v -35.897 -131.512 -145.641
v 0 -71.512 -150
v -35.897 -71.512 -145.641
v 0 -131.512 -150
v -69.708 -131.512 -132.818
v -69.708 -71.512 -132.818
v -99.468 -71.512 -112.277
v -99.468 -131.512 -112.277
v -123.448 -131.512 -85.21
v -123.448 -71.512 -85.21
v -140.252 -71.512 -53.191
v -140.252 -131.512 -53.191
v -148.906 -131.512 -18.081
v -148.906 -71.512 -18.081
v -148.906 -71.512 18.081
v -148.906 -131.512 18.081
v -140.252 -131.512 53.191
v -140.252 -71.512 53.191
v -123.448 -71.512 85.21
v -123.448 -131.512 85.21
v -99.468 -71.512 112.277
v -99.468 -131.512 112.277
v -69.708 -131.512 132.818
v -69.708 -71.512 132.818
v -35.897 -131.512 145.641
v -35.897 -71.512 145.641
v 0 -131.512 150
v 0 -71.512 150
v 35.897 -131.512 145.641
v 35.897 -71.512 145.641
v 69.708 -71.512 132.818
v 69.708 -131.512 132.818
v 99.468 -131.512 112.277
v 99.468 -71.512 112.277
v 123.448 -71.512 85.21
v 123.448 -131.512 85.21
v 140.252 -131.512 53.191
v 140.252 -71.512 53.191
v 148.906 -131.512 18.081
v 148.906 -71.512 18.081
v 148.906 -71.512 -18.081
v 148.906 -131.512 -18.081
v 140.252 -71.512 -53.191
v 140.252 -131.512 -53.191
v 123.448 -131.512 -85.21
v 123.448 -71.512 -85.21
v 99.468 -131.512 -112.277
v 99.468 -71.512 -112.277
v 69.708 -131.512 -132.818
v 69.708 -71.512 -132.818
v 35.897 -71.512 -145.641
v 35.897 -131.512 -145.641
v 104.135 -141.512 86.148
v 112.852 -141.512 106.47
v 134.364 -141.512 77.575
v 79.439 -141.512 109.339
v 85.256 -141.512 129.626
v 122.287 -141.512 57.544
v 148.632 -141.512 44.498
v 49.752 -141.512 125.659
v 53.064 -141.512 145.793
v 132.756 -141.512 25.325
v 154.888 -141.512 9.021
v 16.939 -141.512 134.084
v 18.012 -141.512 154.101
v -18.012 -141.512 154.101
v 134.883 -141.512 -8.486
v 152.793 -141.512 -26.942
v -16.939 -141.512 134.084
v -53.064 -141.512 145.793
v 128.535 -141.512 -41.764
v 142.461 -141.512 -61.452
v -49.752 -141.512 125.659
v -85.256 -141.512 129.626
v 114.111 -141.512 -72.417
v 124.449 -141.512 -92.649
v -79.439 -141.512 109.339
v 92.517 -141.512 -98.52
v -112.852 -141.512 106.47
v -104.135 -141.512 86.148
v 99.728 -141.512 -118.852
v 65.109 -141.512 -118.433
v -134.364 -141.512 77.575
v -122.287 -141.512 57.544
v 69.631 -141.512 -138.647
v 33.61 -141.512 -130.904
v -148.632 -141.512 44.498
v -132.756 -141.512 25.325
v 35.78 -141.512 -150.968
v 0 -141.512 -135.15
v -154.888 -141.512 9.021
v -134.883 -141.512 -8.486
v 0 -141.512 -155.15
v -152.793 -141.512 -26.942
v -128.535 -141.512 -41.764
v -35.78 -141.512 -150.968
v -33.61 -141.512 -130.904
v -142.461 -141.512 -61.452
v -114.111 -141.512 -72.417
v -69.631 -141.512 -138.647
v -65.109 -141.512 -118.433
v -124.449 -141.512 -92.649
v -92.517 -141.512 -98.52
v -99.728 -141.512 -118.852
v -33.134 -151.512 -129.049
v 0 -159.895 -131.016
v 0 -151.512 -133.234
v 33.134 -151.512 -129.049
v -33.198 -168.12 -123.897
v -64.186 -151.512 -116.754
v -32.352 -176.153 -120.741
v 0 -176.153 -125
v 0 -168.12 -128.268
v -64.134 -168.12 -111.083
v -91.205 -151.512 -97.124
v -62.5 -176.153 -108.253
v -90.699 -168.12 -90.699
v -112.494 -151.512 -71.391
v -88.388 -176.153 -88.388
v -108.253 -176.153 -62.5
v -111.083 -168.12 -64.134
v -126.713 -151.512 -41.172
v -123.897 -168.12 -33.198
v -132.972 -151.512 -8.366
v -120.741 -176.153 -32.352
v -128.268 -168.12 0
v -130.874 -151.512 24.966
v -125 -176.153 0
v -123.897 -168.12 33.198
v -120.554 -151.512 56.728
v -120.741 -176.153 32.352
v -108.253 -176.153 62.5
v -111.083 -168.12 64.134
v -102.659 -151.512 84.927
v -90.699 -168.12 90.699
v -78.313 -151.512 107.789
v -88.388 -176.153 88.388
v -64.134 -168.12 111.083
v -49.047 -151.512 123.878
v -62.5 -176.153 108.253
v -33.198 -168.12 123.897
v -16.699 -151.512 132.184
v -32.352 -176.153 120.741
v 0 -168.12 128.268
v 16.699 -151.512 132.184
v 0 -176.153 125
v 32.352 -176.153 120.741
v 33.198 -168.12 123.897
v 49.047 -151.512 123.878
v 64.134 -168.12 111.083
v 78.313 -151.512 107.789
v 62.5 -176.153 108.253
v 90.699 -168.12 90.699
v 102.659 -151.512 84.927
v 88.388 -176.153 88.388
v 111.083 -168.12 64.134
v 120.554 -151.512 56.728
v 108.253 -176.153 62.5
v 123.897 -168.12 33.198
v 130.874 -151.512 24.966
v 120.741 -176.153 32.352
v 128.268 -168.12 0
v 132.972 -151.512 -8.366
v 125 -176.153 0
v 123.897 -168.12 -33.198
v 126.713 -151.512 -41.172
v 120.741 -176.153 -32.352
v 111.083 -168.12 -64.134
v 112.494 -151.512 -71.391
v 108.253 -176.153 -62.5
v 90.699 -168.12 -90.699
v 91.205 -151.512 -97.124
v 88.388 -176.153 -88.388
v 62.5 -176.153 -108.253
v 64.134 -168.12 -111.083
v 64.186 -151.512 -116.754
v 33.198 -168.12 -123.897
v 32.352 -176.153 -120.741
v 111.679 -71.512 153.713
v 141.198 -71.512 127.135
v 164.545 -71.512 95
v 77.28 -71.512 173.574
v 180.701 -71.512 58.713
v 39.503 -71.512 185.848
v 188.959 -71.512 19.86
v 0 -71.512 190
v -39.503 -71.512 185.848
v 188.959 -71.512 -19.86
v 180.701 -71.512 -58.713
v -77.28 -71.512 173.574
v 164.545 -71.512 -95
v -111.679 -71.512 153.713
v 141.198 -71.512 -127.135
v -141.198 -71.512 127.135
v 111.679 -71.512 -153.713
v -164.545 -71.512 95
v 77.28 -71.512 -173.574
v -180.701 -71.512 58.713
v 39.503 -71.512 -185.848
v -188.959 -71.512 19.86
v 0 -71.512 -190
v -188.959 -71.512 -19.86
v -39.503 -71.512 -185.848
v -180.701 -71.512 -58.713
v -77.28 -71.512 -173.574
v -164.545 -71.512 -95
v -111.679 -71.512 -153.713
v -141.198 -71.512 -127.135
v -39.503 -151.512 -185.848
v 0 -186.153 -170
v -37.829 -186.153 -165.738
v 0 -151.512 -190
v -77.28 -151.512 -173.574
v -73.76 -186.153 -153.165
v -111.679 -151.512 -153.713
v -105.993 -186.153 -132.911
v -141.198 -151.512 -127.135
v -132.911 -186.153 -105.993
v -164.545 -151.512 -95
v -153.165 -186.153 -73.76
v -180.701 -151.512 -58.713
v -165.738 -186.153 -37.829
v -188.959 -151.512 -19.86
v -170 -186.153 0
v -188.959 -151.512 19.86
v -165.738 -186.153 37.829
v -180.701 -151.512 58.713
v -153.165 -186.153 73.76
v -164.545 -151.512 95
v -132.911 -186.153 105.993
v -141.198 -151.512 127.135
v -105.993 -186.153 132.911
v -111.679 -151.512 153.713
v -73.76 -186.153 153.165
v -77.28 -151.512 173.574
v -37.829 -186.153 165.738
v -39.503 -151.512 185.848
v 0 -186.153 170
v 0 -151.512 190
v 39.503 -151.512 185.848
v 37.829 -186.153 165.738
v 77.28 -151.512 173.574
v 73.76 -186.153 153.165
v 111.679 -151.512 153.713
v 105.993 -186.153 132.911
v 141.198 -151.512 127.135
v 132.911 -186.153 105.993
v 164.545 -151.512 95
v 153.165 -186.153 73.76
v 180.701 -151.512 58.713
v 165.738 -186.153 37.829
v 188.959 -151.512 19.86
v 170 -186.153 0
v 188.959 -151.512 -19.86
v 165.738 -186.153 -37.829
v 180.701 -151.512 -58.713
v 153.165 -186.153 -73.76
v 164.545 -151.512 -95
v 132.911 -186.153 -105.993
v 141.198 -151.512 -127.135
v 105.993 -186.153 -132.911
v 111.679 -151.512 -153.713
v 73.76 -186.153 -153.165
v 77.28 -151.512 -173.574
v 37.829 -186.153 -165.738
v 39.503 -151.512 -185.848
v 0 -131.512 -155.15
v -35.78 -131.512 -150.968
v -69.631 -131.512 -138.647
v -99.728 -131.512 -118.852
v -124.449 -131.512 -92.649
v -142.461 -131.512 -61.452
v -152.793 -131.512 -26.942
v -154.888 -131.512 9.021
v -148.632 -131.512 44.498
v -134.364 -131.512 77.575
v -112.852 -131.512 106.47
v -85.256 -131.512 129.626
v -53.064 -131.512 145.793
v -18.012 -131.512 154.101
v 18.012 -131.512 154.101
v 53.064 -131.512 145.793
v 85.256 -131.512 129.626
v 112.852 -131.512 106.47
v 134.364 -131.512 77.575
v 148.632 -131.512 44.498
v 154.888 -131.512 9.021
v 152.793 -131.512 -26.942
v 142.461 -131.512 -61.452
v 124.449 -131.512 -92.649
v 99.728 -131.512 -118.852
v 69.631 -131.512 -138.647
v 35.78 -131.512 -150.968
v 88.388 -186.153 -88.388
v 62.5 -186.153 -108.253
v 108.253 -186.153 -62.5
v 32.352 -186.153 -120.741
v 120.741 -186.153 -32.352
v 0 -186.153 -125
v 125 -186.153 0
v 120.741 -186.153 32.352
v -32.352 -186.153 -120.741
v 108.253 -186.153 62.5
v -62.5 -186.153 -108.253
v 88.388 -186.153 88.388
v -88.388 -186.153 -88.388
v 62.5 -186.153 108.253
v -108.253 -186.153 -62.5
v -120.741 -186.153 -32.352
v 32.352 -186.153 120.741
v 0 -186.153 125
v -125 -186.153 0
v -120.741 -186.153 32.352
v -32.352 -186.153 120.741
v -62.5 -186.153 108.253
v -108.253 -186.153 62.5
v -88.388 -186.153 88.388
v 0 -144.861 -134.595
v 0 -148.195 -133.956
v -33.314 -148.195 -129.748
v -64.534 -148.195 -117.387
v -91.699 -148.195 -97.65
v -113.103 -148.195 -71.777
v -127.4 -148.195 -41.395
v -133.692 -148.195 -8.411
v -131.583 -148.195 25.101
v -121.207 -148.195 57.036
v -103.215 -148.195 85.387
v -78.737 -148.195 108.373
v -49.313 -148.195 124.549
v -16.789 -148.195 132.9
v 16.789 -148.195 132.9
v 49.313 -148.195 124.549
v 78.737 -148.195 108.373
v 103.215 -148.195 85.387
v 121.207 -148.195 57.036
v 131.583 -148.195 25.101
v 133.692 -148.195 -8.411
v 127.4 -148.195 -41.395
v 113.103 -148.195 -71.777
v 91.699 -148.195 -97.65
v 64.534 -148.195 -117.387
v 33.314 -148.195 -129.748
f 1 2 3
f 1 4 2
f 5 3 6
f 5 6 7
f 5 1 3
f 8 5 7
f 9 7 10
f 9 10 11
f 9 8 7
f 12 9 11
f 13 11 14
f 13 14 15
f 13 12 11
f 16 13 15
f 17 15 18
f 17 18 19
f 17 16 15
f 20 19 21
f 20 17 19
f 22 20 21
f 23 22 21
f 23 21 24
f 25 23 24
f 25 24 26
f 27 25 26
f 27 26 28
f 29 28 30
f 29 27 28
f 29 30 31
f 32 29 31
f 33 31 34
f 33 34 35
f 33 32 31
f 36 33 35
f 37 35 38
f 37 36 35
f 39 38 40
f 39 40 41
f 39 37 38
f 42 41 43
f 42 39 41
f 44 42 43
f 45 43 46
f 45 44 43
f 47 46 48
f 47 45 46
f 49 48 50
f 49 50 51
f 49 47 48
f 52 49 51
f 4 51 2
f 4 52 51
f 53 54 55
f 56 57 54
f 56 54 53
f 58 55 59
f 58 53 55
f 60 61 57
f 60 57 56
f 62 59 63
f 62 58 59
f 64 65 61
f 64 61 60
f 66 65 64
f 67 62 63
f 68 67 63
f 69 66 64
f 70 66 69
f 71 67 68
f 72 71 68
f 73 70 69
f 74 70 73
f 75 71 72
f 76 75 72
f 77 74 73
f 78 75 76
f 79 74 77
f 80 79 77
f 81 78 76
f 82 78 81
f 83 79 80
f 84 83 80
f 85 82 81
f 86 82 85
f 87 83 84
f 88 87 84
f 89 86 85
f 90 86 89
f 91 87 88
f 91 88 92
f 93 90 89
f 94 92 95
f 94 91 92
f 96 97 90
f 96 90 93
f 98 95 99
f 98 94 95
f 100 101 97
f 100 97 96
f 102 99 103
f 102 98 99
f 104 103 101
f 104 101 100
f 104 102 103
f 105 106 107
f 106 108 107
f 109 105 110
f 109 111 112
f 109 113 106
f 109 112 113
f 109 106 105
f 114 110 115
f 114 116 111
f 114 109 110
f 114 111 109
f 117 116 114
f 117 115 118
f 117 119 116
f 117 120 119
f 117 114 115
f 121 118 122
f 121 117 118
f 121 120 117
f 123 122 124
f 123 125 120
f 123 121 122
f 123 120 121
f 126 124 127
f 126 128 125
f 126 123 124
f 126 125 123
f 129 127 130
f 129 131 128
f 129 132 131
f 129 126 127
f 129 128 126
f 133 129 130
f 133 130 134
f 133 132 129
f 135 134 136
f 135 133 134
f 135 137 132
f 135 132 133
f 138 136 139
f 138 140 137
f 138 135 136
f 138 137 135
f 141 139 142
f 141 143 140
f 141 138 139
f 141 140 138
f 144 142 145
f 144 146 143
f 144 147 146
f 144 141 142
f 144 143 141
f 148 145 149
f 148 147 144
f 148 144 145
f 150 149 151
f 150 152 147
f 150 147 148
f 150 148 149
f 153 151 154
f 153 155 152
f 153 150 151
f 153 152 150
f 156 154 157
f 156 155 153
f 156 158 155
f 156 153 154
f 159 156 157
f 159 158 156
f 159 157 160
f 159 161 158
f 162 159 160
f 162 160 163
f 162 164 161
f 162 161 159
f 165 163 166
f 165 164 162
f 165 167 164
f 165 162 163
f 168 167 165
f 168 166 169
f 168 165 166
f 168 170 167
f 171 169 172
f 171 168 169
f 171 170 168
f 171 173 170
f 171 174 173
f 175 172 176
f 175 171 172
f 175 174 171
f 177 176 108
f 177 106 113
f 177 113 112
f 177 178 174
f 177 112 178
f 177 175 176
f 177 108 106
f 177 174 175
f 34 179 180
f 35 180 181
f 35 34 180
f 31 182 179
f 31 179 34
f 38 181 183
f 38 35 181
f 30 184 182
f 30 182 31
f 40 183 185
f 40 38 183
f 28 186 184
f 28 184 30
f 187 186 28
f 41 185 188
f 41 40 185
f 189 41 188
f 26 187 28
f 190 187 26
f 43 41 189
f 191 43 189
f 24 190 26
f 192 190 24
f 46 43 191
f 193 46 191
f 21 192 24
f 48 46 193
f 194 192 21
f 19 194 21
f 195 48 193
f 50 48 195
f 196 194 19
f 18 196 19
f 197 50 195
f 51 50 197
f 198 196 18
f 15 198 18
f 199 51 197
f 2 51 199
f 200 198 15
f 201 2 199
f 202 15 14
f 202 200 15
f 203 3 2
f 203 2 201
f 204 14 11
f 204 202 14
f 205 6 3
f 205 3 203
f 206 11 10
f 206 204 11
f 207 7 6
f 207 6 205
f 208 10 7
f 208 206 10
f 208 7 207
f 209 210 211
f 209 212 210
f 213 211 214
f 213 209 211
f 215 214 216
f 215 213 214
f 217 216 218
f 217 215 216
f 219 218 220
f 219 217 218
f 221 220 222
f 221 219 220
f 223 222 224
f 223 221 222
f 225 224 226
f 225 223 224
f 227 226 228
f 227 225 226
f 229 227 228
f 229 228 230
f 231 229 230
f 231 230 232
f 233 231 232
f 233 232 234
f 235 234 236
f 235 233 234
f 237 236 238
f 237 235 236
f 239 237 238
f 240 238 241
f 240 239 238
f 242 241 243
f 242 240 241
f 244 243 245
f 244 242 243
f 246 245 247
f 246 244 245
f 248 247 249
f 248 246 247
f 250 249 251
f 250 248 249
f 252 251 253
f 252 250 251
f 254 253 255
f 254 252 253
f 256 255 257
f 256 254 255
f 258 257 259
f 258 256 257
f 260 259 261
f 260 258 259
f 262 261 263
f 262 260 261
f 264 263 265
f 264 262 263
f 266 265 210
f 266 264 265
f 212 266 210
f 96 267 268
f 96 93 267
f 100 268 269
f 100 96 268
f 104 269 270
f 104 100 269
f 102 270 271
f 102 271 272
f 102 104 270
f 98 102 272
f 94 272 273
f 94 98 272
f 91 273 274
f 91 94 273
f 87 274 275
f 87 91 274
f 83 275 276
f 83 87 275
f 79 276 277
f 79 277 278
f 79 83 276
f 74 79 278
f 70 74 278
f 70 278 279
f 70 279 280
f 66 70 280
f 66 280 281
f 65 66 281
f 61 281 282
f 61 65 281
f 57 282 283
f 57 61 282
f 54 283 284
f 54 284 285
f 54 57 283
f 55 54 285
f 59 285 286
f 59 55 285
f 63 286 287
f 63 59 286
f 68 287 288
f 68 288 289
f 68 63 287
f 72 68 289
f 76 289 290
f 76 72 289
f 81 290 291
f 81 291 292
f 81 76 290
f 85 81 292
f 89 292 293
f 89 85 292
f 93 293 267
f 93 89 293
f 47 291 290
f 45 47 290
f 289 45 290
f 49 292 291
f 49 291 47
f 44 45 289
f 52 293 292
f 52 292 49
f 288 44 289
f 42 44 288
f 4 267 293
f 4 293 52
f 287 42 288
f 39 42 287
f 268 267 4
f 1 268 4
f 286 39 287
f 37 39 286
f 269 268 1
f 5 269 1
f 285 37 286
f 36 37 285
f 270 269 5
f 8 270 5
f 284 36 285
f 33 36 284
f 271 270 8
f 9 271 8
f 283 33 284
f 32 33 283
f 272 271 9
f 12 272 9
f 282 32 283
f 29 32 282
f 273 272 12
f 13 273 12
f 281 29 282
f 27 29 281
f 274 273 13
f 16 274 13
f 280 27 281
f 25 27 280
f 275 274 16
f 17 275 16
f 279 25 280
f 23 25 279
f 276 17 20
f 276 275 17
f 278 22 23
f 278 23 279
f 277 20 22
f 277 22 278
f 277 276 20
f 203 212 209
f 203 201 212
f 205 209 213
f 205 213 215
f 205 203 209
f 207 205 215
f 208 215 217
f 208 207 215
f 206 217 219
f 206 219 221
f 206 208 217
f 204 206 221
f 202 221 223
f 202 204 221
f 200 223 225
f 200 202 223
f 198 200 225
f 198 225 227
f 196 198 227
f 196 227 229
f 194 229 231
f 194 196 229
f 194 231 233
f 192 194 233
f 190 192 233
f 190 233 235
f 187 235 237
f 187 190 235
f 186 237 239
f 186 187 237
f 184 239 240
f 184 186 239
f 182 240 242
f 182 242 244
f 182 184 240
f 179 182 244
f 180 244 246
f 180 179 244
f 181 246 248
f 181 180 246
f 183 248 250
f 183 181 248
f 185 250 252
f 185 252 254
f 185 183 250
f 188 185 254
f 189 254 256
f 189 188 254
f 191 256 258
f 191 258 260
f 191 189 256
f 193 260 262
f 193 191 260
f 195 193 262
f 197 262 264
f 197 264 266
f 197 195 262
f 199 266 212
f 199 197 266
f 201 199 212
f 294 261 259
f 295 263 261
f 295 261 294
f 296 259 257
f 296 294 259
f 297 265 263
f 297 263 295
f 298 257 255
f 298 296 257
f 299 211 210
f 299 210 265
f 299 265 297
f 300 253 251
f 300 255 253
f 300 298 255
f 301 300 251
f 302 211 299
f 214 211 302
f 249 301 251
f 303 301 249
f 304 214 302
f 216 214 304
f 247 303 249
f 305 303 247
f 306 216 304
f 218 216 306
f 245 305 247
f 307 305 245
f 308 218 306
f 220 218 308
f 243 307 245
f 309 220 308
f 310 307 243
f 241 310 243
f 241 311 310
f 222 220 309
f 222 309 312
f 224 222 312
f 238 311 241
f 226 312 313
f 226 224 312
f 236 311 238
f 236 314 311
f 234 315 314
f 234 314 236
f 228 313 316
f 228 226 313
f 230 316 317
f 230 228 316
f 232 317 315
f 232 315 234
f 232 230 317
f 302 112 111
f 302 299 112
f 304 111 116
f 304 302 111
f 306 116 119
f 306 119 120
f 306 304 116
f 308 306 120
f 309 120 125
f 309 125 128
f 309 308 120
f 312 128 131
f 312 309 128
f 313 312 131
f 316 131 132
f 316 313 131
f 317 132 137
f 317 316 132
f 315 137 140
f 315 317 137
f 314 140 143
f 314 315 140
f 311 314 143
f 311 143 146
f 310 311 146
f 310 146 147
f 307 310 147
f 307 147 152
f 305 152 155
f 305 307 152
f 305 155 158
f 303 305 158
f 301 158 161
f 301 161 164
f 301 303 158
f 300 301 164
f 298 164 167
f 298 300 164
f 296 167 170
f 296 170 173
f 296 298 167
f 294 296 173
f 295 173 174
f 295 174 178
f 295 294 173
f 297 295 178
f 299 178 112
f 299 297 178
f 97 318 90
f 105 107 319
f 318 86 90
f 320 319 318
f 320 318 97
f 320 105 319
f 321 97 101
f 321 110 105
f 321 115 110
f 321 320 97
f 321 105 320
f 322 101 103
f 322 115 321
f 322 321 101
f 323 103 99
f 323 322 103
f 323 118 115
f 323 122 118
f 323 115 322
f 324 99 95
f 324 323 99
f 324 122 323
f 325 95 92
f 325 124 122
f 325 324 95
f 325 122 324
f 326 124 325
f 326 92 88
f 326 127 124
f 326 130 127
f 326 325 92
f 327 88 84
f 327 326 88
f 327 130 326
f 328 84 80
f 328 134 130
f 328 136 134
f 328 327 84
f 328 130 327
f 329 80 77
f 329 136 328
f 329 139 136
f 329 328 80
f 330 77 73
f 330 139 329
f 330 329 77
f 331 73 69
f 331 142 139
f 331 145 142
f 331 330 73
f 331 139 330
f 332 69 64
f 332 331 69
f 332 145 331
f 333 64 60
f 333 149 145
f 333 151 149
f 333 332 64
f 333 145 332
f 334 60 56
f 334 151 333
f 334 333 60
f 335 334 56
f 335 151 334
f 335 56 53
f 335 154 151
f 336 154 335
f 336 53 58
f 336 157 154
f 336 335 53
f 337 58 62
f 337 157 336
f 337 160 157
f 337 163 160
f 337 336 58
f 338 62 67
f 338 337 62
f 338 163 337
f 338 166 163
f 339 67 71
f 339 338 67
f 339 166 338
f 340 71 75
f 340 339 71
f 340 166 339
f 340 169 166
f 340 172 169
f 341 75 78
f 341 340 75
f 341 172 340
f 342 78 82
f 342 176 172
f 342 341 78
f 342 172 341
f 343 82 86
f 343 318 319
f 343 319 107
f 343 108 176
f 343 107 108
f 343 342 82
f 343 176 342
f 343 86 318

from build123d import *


with BuildPart() as part:
    # Esquisse1 → Révolution1 (revolve)
    with BuildSketch(Plane.XY, mode=Mode.PRIVATE) as r_volution1_sk:
        with BuildLine():
            Line((133.234412351, -151.511992469), (190, -151.511992469))
            Line((190, -151.511992469), (190, -71.511992469))
            Line((190, -71.511992469), (150, -71.511992469))
            Line((150, -71.511992469), (150, -131.511992469))
            Line((150, -131.511992469), (155.15, -131.511992469))
            Line((155.15, -131.511992469), (155.15, -141.511992469))
            Line((155.15, -141.511992469), (135.15, -141.511992469))
            ThreePointArc((135.15, -141.511992469), (134.28591859, -146.529943903), (133.234412351, -151.511992469))
        make_face()
        with BuildLine():
            Line((125, -176.15300862), (125, -186.15300862))
            Line((125, -186.15300862), (170, -186.15300862))
            Line((170, -186.15300862), (190, -151.511992469))
            Line((190, -151.511992469), (133.234412351, -151.511992469))
            ThreePointArc((133.234412351, -151.511992469), (129.707571602, -164.029785929), (125, -176.15300862))
        make_face()
    revolve(r_volution1_sk.sketch.rotate(Axis((0, -202.934552656, 0), (0, 1, 0)), 90), axis=Axis((0, -202.934552656, 0), (0, 1, 0)))


solid = part.part
